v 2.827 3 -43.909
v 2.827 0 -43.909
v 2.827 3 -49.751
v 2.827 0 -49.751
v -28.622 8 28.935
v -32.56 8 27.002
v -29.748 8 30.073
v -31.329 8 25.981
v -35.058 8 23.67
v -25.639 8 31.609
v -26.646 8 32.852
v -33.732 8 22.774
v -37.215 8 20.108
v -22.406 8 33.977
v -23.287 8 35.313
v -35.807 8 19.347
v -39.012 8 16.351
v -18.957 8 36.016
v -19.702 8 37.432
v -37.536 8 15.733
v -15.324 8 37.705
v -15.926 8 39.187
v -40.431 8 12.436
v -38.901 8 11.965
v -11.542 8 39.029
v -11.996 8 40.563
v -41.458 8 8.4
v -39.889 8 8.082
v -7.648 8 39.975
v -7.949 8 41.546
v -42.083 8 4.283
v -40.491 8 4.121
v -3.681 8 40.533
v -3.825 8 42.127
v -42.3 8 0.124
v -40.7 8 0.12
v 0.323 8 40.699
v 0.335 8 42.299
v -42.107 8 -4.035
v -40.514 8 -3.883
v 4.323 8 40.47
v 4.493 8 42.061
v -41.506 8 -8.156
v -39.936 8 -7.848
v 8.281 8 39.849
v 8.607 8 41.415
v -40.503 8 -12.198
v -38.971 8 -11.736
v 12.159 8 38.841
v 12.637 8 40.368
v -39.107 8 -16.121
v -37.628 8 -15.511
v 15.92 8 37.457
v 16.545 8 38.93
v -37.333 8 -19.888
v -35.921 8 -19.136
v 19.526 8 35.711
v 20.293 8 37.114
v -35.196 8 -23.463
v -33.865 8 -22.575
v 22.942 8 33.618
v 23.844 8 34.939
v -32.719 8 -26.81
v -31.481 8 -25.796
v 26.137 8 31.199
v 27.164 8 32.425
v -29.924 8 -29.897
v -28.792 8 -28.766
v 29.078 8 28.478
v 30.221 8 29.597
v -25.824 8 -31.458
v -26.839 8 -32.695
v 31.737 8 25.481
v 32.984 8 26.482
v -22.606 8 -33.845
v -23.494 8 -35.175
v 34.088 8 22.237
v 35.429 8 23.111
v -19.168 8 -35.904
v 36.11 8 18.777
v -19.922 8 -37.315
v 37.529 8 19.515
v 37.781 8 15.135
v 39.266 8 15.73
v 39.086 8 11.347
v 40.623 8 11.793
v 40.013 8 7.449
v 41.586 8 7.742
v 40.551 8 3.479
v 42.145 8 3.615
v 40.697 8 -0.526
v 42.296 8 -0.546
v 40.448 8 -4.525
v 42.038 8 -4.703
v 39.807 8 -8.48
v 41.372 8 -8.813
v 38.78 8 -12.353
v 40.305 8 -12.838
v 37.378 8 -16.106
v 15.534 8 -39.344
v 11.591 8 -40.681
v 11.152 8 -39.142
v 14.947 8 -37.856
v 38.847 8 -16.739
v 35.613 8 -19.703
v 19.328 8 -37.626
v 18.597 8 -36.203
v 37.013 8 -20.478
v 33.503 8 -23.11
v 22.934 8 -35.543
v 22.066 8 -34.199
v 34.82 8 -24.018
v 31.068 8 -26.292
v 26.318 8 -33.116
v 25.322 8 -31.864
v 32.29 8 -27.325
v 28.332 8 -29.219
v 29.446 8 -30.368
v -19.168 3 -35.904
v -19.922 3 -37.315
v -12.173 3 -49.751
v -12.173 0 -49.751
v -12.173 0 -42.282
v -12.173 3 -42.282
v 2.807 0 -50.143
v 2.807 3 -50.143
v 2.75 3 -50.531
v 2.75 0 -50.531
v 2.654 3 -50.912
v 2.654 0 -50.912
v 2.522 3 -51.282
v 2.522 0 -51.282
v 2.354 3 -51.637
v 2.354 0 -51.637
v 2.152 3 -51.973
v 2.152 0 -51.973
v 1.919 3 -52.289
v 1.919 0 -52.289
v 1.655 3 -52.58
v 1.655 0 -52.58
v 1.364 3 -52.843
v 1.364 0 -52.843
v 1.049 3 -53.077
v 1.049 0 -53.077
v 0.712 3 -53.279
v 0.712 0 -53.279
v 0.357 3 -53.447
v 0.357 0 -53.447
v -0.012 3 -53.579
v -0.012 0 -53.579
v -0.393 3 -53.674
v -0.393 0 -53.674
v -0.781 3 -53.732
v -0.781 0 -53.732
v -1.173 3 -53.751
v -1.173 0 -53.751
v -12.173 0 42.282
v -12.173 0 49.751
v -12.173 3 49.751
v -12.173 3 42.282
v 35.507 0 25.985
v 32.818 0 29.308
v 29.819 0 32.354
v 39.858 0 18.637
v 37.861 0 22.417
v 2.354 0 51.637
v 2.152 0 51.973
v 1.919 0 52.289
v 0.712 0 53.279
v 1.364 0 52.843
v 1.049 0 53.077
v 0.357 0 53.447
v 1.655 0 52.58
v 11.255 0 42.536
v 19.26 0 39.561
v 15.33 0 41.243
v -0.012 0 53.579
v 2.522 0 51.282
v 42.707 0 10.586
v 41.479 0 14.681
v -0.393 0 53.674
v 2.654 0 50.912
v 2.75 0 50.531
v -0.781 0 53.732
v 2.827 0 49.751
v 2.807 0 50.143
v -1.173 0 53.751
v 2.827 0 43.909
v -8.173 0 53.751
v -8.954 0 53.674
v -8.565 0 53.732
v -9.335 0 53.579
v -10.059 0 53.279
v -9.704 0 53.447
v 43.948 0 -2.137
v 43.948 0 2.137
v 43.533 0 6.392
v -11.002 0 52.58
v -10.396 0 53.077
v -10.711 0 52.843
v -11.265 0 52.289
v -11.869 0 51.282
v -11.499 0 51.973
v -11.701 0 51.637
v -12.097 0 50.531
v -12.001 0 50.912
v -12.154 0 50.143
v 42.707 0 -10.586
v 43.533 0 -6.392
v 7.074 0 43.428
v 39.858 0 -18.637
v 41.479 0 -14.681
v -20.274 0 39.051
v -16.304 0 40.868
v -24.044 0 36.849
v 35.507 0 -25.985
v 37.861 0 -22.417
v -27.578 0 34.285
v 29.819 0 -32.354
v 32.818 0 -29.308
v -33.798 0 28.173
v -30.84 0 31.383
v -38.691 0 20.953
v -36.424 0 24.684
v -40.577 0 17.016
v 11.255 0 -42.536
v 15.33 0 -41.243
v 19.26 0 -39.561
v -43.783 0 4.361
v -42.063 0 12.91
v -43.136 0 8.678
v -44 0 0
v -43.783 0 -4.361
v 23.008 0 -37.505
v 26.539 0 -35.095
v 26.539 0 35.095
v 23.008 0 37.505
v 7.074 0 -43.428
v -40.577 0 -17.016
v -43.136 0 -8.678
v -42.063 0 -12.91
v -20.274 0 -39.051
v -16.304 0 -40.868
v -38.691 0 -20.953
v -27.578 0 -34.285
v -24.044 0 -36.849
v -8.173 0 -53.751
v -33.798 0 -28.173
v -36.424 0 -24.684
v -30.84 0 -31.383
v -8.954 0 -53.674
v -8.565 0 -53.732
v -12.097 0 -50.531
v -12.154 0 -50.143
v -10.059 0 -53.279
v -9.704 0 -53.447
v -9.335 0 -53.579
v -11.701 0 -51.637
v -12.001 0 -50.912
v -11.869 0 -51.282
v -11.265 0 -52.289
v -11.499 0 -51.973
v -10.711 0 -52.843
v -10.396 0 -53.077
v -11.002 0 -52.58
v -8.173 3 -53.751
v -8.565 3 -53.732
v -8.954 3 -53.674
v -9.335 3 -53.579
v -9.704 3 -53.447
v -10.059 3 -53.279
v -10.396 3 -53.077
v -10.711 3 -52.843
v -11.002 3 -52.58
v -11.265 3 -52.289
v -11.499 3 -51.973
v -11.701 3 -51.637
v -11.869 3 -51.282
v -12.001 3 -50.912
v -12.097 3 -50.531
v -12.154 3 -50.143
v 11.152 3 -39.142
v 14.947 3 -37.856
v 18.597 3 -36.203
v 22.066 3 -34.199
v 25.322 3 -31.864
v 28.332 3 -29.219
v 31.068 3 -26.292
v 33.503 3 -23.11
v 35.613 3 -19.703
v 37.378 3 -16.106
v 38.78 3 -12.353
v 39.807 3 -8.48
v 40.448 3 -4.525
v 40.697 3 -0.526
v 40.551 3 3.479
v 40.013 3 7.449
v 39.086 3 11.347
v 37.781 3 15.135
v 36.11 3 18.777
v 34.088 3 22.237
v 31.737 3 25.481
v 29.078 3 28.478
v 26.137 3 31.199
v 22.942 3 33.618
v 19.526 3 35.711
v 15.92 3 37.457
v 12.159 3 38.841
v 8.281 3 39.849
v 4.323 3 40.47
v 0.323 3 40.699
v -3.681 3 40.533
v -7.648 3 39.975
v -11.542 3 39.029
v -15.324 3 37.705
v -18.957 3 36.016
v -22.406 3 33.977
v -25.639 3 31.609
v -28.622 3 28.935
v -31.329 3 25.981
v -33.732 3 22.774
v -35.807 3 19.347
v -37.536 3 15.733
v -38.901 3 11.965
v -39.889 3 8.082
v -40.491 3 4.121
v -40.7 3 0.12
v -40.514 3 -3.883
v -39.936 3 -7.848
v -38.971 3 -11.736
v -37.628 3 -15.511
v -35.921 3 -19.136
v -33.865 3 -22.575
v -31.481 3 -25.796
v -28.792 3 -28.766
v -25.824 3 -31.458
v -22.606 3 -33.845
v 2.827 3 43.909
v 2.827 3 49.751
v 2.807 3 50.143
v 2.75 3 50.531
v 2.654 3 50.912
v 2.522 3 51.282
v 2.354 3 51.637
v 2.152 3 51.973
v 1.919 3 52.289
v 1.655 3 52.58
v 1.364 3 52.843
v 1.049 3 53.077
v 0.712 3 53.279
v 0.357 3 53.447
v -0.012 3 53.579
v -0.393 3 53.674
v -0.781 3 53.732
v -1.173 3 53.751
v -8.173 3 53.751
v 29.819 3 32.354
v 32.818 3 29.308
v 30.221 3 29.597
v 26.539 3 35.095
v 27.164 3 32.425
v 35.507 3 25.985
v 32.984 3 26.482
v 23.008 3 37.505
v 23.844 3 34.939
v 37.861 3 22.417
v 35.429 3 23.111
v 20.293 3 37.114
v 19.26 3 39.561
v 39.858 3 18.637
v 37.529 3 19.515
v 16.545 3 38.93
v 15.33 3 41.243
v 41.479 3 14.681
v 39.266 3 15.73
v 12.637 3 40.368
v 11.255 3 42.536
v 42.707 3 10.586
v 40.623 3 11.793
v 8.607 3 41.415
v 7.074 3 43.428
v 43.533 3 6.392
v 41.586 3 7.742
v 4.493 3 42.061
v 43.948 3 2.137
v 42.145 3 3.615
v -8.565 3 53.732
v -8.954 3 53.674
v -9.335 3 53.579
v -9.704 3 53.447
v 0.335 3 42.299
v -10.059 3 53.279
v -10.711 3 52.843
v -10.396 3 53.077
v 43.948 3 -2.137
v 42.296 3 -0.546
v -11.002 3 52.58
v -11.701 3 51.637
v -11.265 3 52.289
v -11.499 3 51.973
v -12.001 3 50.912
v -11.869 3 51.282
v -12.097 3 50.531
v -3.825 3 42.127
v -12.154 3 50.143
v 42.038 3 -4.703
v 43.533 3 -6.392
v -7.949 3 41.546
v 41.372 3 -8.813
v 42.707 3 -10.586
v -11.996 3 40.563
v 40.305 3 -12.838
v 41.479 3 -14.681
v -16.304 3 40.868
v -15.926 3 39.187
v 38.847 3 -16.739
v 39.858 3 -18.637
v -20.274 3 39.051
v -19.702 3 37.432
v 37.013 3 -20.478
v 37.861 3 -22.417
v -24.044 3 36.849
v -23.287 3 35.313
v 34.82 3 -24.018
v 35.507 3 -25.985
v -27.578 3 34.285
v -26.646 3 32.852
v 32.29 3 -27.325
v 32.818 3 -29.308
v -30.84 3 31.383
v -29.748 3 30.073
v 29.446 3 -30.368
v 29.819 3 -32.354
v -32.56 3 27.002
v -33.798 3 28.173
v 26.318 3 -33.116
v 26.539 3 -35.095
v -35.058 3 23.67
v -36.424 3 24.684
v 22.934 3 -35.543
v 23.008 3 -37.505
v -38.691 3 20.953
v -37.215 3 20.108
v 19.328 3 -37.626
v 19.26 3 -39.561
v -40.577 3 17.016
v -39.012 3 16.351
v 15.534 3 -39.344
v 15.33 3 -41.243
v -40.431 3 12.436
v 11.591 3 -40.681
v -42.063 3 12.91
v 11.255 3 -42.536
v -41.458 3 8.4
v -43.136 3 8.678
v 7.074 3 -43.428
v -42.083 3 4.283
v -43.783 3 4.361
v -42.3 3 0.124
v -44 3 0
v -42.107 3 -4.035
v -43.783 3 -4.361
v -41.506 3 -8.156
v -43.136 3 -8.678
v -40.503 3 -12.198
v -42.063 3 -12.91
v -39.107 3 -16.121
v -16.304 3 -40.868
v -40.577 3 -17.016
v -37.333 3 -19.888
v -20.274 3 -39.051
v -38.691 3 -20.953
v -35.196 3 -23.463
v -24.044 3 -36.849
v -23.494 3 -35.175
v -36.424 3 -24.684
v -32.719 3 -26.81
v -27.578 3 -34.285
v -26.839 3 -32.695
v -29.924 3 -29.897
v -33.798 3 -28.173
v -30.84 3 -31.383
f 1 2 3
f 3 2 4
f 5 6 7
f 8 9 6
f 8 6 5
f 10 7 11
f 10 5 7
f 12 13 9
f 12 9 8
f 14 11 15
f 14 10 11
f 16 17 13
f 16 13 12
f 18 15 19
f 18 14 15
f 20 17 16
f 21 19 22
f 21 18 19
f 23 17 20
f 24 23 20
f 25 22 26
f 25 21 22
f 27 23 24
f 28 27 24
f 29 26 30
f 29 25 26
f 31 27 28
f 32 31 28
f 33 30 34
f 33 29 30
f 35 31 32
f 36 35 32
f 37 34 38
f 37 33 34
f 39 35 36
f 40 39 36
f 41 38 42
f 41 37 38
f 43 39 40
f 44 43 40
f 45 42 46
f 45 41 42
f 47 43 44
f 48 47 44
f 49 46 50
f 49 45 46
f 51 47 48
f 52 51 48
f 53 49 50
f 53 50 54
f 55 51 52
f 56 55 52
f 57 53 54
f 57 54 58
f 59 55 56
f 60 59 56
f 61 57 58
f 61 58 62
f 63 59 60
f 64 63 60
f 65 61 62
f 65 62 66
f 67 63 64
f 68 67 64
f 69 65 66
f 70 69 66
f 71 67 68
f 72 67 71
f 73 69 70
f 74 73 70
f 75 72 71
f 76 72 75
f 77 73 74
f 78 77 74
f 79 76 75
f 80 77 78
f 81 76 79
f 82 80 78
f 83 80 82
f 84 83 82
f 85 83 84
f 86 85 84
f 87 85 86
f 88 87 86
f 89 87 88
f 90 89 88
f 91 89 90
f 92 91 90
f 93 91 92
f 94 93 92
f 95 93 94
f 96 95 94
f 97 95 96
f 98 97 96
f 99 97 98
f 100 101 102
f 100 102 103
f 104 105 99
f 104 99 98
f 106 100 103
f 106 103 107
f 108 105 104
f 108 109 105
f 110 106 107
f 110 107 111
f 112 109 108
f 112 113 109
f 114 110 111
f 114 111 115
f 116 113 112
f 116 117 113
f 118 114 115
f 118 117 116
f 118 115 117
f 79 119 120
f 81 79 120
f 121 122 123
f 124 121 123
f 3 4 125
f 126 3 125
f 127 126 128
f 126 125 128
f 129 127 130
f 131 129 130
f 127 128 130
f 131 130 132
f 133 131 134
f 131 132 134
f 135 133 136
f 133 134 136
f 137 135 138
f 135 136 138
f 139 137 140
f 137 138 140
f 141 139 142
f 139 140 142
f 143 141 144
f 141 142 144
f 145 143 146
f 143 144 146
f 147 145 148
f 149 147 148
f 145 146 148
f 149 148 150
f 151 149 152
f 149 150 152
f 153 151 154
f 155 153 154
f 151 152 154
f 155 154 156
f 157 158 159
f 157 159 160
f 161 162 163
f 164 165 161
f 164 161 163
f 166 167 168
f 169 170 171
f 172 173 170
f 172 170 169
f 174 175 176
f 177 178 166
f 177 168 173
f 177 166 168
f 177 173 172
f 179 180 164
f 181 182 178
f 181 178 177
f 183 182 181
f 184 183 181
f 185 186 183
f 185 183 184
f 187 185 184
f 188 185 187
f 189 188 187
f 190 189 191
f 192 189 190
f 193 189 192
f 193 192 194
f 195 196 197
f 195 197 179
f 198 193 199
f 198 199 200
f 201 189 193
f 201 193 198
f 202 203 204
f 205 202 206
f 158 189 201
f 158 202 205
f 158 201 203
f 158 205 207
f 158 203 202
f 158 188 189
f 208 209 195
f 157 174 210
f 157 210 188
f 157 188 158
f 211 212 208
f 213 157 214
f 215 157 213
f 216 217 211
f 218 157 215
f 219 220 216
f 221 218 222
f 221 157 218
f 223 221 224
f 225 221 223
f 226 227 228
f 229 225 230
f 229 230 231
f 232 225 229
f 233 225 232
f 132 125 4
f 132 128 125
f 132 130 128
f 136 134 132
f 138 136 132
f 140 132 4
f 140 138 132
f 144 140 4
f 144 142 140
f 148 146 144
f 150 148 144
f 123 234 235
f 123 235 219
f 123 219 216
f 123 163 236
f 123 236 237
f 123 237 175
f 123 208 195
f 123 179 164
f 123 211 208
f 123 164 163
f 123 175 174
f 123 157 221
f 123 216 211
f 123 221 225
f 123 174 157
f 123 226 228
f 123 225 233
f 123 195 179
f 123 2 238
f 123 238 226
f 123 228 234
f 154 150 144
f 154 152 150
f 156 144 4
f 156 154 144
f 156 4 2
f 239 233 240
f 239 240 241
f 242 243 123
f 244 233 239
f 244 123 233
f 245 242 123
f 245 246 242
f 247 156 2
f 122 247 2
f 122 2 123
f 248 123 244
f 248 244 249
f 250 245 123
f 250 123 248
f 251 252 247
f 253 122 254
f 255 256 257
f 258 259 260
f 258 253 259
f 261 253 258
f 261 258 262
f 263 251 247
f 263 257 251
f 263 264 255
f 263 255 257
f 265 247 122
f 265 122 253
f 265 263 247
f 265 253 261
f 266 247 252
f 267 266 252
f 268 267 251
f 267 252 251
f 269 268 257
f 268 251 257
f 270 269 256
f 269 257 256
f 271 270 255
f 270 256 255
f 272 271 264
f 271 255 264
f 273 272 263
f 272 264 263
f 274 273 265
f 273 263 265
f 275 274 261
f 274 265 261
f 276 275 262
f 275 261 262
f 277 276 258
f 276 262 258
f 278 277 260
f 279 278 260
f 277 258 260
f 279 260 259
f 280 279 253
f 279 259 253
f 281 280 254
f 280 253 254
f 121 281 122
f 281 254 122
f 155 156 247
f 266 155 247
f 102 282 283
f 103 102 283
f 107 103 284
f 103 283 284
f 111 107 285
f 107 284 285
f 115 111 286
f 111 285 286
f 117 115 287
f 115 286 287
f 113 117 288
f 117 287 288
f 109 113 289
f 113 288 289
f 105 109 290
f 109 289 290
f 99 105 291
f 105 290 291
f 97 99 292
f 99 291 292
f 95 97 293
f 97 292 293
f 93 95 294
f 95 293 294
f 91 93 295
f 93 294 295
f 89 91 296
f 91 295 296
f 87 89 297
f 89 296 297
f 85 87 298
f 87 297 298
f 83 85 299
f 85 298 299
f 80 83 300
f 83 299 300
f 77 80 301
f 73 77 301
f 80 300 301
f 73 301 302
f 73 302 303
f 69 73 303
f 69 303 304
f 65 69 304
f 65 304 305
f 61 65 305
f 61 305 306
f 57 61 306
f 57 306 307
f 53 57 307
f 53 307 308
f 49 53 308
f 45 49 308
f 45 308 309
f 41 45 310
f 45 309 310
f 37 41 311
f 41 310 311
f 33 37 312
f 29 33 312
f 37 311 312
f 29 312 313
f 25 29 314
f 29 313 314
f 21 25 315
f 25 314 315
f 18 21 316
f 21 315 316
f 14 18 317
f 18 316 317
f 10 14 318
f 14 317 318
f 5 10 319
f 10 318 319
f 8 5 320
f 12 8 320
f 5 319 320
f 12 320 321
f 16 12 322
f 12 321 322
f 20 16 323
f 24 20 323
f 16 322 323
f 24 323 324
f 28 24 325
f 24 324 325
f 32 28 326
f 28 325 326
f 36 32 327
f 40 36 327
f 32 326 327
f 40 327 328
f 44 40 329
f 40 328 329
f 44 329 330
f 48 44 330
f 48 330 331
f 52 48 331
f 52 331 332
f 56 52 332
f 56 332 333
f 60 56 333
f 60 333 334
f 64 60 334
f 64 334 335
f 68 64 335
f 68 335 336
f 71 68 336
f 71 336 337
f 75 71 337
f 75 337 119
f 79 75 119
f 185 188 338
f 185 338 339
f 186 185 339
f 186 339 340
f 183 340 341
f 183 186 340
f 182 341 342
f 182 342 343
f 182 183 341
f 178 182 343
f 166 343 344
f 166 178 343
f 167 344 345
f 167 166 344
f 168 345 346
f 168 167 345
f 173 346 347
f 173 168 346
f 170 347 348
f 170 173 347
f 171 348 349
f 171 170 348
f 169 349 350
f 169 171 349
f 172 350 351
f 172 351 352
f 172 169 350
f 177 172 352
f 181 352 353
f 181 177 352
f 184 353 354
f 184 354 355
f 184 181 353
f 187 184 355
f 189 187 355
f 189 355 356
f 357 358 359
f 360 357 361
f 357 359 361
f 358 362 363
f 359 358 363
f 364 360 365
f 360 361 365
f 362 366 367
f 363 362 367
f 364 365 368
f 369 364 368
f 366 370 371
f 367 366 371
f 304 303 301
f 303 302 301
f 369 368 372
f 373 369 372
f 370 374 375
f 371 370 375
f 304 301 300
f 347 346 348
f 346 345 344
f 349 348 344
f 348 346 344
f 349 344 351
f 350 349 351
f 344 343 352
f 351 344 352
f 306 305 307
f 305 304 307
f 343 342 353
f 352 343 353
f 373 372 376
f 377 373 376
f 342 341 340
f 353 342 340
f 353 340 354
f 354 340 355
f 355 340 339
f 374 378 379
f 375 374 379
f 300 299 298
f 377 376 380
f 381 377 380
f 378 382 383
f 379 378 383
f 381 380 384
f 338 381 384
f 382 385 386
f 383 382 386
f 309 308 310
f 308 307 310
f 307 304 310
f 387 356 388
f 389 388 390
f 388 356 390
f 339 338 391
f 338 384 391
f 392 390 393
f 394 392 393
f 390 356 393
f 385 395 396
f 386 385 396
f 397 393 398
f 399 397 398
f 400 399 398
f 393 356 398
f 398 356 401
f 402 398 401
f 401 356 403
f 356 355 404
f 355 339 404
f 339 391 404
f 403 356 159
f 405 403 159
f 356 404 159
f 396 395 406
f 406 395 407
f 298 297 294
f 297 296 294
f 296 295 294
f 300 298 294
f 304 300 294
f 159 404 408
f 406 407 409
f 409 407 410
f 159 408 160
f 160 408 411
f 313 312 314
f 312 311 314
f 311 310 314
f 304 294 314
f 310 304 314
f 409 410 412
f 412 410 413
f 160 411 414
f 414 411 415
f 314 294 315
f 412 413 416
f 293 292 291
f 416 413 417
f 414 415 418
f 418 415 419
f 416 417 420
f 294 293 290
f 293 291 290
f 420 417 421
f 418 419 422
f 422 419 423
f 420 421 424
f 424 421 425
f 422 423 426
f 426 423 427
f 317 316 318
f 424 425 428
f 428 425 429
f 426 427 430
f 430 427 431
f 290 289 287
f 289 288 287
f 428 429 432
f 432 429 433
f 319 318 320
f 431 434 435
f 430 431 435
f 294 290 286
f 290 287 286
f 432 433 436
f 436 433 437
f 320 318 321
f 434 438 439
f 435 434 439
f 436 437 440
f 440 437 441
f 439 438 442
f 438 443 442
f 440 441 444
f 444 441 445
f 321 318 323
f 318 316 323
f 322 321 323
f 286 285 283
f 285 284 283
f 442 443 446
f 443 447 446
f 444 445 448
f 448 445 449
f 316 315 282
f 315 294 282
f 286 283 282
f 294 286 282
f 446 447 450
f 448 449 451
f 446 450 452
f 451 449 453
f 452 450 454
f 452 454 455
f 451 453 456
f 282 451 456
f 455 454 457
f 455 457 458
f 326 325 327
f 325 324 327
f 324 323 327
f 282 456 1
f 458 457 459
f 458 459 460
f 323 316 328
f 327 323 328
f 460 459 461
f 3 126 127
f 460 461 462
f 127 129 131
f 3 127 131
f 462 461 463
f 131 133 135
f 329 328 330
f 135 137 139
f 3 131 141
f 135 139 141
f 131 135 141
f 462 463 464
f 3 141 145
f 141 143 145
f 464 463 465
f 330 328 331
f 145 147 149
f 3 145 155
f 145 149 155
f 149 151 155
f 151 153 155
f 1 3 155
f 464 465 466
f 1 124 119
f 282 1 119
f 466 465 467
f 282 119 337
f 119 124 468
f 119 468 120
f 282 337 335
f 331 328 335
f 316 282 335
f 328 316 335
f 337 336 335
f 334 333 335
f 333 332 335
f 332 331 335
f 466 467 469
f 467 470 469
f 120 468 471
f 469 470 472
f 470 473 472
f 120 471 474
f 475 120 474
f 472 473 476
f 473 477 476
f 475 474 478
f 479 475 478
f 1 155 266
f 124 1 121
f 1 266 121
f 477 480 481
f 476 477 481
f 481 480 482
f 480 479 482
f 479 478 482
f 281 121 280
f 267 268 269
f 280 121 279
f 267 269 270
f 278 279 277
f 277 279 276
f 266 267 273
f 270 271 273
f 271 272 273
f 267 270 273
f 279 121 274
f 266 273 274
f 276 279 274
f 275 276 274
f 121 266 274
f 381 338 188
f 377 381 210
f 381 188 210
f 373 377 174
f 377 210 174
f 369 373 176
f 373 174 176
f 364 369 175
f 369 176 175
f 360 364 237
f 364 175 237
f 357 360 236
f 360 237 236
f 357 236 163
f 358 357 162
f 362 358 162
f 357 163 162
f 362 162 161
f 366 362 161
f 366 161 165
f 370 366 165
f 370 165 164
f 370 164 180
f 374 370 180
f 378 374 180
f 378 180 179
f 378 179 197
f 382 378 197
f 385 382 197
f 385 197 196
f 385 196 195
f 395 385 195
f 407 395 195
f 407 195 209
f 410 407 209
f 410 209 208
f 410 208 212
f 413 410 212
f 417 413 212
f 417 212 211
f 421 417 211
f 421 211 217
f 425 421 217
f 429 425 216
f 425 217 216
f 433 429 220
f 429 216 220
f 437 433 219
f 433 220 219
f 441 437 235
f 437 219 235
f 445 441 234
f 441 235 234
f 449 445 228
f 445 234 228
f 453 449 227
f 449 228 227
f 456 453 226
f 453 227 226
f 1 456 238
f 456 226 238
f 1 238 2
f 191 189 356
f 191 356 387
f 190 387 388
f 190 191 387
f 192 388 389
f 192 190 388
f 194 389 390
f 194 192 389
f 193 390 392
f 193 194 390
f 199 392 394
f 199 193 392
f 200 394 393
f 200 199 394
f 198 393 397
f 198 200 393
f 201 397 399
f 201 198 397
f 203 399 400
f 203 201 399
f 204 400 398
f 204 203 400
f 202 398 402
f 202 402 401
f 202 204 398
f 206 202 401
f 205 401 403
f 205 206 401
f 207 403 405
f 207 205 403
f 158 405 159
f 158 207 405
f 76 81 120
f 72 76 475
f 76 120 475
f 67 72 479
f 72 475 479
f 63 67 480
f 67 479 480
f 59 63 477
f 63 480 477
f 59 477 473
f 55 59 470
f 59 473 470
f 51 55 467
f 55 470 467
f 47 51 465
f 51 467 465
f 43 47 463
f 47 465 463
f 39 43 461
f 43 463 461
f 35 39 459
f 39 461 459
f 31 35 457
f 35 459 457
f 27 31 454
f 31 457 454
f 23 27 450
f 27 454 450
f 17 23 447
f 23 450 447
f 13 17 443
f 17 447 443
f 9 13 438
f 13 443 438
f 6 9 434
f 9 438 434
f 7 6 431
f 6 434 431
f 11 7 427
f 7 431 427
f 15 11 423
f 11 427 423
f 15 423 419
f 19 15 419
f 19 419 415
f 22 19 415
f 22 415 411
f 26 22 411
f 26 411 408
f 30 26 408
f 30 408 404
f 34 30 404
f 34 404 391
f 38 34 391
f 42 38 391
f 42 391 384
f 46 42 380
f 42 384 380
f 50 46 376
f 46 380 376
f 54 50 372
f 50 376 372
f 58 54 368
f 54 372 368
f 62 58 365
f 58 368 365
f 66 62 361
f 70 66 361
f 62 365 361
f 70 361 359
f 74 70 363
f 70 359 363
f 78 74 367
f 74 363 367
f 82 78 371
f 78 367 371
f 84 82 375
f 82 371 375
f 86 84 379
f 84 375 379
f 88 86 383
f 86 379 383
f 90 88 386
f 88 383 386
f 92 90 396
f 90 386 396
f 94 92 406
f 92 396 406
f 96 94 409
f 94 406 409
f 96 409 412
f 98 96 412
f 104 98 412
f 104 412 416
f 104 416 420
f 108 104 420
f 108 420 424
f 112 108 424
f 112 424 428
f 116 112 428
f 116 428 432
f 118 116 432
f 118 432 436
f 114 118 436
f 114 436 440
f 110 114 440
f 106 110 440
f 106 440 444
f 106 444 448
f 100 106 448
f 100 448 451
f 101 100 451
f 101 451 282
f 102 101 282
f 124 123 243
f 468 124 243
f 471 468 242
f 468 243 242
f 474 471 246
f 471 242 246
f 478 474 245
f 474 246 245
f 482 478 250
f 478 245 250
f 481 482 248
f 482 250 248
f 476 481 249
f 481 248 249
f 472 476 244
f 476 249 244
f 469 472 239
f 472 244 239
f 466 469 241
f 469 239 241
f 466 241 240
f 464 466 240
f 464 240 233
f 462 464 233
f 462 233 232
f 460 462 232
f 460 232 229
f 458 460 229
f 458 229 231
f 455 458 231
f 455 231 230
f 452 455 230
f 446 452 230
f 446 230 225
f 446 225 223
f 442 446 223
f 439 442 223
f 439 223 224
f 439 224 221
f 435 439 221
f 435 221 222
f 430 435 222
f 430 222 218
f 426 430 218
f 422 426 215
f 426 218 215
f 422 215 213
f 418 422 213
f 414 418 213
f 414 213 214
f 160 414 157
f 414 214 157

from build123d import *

# Parameters (mm, degrees)
SKETCH1_R           = 44
BOSS_EXTRUDE1_DEPTH = 3
BOSS_EXTRUDE2_DEPTH = 5
BOSS_EXTRUDE3_DEPTH = 3


with BuildPart() as part:
    # Sketch1 → Boss-Extrude1 (new body)
    with BuildSketch(Plane(origin=(0, 0, 0), x_dir=(1, 0, 0), z_dir=(0, 1, 0))):
        Circle(SKETCH1_R)
    extrude(amount=BOSS_EXTRUDE1_DEPTH)

    # Sketch2 → Boss-Extrude2 (add)
    with BuildSketch(Plane(origin=(0, 3, 0), x_dir=(1, 0, 0), z_dir=(0, 1, 0))):
        with BuildLine():
            Line((-19.168383357, 35.903524611), (-19.921931597, 37.314965382))
            ThreePointArc((-19.921931597, 37.314965382), (4.492861264, -42.060720366), (11.590514748, 40.681076287))
            Line((11.590514748, 40.681076287), (11.152102843, 39.142312172))
            ThreePointArc((11.152102843, 39.142312172), (4.322918521, -40.469771132), (-19.168383357, 35.903524611))
        make_face()
    extrude(amount=BOSS_EXTRUDE2_DEPTH)

    # Sketch3 → Boss-Extrude3 (add)
    with BuildSketch(Plane.XZ):
        with BuildLine():
            Line((-1.173425428, -53.751103926), (-8.173425428, -53.751103926))
            ThreePointArc((-8.173425428, -53.751103926), (-11.001852553, -52.579531051), (-12.173425428, -49.751103926))
            Line((-12.173425428, -49.751103926), (-12.173425428, -33.751103926))
            Line((-12.173425428, -33.751103926), (2.826574572, -33.751103926))
            Line((2.826574572, -33.751103926), (2.826574572, -49.751103926))
            ThreePointArc((2.826574572, -49.751103926), (1.655001697, -52.579531051), (-1.173425428, -53.751103926))
        make_face()
    boss_extrude3 = extrude(amount=-BOSS_EXTRUDE3_DEPTH)

    # Mirror1: Boss-Extrude3 across plane
    add(boss_extrude3.mirror(Plane.XY))


solid = part.part
